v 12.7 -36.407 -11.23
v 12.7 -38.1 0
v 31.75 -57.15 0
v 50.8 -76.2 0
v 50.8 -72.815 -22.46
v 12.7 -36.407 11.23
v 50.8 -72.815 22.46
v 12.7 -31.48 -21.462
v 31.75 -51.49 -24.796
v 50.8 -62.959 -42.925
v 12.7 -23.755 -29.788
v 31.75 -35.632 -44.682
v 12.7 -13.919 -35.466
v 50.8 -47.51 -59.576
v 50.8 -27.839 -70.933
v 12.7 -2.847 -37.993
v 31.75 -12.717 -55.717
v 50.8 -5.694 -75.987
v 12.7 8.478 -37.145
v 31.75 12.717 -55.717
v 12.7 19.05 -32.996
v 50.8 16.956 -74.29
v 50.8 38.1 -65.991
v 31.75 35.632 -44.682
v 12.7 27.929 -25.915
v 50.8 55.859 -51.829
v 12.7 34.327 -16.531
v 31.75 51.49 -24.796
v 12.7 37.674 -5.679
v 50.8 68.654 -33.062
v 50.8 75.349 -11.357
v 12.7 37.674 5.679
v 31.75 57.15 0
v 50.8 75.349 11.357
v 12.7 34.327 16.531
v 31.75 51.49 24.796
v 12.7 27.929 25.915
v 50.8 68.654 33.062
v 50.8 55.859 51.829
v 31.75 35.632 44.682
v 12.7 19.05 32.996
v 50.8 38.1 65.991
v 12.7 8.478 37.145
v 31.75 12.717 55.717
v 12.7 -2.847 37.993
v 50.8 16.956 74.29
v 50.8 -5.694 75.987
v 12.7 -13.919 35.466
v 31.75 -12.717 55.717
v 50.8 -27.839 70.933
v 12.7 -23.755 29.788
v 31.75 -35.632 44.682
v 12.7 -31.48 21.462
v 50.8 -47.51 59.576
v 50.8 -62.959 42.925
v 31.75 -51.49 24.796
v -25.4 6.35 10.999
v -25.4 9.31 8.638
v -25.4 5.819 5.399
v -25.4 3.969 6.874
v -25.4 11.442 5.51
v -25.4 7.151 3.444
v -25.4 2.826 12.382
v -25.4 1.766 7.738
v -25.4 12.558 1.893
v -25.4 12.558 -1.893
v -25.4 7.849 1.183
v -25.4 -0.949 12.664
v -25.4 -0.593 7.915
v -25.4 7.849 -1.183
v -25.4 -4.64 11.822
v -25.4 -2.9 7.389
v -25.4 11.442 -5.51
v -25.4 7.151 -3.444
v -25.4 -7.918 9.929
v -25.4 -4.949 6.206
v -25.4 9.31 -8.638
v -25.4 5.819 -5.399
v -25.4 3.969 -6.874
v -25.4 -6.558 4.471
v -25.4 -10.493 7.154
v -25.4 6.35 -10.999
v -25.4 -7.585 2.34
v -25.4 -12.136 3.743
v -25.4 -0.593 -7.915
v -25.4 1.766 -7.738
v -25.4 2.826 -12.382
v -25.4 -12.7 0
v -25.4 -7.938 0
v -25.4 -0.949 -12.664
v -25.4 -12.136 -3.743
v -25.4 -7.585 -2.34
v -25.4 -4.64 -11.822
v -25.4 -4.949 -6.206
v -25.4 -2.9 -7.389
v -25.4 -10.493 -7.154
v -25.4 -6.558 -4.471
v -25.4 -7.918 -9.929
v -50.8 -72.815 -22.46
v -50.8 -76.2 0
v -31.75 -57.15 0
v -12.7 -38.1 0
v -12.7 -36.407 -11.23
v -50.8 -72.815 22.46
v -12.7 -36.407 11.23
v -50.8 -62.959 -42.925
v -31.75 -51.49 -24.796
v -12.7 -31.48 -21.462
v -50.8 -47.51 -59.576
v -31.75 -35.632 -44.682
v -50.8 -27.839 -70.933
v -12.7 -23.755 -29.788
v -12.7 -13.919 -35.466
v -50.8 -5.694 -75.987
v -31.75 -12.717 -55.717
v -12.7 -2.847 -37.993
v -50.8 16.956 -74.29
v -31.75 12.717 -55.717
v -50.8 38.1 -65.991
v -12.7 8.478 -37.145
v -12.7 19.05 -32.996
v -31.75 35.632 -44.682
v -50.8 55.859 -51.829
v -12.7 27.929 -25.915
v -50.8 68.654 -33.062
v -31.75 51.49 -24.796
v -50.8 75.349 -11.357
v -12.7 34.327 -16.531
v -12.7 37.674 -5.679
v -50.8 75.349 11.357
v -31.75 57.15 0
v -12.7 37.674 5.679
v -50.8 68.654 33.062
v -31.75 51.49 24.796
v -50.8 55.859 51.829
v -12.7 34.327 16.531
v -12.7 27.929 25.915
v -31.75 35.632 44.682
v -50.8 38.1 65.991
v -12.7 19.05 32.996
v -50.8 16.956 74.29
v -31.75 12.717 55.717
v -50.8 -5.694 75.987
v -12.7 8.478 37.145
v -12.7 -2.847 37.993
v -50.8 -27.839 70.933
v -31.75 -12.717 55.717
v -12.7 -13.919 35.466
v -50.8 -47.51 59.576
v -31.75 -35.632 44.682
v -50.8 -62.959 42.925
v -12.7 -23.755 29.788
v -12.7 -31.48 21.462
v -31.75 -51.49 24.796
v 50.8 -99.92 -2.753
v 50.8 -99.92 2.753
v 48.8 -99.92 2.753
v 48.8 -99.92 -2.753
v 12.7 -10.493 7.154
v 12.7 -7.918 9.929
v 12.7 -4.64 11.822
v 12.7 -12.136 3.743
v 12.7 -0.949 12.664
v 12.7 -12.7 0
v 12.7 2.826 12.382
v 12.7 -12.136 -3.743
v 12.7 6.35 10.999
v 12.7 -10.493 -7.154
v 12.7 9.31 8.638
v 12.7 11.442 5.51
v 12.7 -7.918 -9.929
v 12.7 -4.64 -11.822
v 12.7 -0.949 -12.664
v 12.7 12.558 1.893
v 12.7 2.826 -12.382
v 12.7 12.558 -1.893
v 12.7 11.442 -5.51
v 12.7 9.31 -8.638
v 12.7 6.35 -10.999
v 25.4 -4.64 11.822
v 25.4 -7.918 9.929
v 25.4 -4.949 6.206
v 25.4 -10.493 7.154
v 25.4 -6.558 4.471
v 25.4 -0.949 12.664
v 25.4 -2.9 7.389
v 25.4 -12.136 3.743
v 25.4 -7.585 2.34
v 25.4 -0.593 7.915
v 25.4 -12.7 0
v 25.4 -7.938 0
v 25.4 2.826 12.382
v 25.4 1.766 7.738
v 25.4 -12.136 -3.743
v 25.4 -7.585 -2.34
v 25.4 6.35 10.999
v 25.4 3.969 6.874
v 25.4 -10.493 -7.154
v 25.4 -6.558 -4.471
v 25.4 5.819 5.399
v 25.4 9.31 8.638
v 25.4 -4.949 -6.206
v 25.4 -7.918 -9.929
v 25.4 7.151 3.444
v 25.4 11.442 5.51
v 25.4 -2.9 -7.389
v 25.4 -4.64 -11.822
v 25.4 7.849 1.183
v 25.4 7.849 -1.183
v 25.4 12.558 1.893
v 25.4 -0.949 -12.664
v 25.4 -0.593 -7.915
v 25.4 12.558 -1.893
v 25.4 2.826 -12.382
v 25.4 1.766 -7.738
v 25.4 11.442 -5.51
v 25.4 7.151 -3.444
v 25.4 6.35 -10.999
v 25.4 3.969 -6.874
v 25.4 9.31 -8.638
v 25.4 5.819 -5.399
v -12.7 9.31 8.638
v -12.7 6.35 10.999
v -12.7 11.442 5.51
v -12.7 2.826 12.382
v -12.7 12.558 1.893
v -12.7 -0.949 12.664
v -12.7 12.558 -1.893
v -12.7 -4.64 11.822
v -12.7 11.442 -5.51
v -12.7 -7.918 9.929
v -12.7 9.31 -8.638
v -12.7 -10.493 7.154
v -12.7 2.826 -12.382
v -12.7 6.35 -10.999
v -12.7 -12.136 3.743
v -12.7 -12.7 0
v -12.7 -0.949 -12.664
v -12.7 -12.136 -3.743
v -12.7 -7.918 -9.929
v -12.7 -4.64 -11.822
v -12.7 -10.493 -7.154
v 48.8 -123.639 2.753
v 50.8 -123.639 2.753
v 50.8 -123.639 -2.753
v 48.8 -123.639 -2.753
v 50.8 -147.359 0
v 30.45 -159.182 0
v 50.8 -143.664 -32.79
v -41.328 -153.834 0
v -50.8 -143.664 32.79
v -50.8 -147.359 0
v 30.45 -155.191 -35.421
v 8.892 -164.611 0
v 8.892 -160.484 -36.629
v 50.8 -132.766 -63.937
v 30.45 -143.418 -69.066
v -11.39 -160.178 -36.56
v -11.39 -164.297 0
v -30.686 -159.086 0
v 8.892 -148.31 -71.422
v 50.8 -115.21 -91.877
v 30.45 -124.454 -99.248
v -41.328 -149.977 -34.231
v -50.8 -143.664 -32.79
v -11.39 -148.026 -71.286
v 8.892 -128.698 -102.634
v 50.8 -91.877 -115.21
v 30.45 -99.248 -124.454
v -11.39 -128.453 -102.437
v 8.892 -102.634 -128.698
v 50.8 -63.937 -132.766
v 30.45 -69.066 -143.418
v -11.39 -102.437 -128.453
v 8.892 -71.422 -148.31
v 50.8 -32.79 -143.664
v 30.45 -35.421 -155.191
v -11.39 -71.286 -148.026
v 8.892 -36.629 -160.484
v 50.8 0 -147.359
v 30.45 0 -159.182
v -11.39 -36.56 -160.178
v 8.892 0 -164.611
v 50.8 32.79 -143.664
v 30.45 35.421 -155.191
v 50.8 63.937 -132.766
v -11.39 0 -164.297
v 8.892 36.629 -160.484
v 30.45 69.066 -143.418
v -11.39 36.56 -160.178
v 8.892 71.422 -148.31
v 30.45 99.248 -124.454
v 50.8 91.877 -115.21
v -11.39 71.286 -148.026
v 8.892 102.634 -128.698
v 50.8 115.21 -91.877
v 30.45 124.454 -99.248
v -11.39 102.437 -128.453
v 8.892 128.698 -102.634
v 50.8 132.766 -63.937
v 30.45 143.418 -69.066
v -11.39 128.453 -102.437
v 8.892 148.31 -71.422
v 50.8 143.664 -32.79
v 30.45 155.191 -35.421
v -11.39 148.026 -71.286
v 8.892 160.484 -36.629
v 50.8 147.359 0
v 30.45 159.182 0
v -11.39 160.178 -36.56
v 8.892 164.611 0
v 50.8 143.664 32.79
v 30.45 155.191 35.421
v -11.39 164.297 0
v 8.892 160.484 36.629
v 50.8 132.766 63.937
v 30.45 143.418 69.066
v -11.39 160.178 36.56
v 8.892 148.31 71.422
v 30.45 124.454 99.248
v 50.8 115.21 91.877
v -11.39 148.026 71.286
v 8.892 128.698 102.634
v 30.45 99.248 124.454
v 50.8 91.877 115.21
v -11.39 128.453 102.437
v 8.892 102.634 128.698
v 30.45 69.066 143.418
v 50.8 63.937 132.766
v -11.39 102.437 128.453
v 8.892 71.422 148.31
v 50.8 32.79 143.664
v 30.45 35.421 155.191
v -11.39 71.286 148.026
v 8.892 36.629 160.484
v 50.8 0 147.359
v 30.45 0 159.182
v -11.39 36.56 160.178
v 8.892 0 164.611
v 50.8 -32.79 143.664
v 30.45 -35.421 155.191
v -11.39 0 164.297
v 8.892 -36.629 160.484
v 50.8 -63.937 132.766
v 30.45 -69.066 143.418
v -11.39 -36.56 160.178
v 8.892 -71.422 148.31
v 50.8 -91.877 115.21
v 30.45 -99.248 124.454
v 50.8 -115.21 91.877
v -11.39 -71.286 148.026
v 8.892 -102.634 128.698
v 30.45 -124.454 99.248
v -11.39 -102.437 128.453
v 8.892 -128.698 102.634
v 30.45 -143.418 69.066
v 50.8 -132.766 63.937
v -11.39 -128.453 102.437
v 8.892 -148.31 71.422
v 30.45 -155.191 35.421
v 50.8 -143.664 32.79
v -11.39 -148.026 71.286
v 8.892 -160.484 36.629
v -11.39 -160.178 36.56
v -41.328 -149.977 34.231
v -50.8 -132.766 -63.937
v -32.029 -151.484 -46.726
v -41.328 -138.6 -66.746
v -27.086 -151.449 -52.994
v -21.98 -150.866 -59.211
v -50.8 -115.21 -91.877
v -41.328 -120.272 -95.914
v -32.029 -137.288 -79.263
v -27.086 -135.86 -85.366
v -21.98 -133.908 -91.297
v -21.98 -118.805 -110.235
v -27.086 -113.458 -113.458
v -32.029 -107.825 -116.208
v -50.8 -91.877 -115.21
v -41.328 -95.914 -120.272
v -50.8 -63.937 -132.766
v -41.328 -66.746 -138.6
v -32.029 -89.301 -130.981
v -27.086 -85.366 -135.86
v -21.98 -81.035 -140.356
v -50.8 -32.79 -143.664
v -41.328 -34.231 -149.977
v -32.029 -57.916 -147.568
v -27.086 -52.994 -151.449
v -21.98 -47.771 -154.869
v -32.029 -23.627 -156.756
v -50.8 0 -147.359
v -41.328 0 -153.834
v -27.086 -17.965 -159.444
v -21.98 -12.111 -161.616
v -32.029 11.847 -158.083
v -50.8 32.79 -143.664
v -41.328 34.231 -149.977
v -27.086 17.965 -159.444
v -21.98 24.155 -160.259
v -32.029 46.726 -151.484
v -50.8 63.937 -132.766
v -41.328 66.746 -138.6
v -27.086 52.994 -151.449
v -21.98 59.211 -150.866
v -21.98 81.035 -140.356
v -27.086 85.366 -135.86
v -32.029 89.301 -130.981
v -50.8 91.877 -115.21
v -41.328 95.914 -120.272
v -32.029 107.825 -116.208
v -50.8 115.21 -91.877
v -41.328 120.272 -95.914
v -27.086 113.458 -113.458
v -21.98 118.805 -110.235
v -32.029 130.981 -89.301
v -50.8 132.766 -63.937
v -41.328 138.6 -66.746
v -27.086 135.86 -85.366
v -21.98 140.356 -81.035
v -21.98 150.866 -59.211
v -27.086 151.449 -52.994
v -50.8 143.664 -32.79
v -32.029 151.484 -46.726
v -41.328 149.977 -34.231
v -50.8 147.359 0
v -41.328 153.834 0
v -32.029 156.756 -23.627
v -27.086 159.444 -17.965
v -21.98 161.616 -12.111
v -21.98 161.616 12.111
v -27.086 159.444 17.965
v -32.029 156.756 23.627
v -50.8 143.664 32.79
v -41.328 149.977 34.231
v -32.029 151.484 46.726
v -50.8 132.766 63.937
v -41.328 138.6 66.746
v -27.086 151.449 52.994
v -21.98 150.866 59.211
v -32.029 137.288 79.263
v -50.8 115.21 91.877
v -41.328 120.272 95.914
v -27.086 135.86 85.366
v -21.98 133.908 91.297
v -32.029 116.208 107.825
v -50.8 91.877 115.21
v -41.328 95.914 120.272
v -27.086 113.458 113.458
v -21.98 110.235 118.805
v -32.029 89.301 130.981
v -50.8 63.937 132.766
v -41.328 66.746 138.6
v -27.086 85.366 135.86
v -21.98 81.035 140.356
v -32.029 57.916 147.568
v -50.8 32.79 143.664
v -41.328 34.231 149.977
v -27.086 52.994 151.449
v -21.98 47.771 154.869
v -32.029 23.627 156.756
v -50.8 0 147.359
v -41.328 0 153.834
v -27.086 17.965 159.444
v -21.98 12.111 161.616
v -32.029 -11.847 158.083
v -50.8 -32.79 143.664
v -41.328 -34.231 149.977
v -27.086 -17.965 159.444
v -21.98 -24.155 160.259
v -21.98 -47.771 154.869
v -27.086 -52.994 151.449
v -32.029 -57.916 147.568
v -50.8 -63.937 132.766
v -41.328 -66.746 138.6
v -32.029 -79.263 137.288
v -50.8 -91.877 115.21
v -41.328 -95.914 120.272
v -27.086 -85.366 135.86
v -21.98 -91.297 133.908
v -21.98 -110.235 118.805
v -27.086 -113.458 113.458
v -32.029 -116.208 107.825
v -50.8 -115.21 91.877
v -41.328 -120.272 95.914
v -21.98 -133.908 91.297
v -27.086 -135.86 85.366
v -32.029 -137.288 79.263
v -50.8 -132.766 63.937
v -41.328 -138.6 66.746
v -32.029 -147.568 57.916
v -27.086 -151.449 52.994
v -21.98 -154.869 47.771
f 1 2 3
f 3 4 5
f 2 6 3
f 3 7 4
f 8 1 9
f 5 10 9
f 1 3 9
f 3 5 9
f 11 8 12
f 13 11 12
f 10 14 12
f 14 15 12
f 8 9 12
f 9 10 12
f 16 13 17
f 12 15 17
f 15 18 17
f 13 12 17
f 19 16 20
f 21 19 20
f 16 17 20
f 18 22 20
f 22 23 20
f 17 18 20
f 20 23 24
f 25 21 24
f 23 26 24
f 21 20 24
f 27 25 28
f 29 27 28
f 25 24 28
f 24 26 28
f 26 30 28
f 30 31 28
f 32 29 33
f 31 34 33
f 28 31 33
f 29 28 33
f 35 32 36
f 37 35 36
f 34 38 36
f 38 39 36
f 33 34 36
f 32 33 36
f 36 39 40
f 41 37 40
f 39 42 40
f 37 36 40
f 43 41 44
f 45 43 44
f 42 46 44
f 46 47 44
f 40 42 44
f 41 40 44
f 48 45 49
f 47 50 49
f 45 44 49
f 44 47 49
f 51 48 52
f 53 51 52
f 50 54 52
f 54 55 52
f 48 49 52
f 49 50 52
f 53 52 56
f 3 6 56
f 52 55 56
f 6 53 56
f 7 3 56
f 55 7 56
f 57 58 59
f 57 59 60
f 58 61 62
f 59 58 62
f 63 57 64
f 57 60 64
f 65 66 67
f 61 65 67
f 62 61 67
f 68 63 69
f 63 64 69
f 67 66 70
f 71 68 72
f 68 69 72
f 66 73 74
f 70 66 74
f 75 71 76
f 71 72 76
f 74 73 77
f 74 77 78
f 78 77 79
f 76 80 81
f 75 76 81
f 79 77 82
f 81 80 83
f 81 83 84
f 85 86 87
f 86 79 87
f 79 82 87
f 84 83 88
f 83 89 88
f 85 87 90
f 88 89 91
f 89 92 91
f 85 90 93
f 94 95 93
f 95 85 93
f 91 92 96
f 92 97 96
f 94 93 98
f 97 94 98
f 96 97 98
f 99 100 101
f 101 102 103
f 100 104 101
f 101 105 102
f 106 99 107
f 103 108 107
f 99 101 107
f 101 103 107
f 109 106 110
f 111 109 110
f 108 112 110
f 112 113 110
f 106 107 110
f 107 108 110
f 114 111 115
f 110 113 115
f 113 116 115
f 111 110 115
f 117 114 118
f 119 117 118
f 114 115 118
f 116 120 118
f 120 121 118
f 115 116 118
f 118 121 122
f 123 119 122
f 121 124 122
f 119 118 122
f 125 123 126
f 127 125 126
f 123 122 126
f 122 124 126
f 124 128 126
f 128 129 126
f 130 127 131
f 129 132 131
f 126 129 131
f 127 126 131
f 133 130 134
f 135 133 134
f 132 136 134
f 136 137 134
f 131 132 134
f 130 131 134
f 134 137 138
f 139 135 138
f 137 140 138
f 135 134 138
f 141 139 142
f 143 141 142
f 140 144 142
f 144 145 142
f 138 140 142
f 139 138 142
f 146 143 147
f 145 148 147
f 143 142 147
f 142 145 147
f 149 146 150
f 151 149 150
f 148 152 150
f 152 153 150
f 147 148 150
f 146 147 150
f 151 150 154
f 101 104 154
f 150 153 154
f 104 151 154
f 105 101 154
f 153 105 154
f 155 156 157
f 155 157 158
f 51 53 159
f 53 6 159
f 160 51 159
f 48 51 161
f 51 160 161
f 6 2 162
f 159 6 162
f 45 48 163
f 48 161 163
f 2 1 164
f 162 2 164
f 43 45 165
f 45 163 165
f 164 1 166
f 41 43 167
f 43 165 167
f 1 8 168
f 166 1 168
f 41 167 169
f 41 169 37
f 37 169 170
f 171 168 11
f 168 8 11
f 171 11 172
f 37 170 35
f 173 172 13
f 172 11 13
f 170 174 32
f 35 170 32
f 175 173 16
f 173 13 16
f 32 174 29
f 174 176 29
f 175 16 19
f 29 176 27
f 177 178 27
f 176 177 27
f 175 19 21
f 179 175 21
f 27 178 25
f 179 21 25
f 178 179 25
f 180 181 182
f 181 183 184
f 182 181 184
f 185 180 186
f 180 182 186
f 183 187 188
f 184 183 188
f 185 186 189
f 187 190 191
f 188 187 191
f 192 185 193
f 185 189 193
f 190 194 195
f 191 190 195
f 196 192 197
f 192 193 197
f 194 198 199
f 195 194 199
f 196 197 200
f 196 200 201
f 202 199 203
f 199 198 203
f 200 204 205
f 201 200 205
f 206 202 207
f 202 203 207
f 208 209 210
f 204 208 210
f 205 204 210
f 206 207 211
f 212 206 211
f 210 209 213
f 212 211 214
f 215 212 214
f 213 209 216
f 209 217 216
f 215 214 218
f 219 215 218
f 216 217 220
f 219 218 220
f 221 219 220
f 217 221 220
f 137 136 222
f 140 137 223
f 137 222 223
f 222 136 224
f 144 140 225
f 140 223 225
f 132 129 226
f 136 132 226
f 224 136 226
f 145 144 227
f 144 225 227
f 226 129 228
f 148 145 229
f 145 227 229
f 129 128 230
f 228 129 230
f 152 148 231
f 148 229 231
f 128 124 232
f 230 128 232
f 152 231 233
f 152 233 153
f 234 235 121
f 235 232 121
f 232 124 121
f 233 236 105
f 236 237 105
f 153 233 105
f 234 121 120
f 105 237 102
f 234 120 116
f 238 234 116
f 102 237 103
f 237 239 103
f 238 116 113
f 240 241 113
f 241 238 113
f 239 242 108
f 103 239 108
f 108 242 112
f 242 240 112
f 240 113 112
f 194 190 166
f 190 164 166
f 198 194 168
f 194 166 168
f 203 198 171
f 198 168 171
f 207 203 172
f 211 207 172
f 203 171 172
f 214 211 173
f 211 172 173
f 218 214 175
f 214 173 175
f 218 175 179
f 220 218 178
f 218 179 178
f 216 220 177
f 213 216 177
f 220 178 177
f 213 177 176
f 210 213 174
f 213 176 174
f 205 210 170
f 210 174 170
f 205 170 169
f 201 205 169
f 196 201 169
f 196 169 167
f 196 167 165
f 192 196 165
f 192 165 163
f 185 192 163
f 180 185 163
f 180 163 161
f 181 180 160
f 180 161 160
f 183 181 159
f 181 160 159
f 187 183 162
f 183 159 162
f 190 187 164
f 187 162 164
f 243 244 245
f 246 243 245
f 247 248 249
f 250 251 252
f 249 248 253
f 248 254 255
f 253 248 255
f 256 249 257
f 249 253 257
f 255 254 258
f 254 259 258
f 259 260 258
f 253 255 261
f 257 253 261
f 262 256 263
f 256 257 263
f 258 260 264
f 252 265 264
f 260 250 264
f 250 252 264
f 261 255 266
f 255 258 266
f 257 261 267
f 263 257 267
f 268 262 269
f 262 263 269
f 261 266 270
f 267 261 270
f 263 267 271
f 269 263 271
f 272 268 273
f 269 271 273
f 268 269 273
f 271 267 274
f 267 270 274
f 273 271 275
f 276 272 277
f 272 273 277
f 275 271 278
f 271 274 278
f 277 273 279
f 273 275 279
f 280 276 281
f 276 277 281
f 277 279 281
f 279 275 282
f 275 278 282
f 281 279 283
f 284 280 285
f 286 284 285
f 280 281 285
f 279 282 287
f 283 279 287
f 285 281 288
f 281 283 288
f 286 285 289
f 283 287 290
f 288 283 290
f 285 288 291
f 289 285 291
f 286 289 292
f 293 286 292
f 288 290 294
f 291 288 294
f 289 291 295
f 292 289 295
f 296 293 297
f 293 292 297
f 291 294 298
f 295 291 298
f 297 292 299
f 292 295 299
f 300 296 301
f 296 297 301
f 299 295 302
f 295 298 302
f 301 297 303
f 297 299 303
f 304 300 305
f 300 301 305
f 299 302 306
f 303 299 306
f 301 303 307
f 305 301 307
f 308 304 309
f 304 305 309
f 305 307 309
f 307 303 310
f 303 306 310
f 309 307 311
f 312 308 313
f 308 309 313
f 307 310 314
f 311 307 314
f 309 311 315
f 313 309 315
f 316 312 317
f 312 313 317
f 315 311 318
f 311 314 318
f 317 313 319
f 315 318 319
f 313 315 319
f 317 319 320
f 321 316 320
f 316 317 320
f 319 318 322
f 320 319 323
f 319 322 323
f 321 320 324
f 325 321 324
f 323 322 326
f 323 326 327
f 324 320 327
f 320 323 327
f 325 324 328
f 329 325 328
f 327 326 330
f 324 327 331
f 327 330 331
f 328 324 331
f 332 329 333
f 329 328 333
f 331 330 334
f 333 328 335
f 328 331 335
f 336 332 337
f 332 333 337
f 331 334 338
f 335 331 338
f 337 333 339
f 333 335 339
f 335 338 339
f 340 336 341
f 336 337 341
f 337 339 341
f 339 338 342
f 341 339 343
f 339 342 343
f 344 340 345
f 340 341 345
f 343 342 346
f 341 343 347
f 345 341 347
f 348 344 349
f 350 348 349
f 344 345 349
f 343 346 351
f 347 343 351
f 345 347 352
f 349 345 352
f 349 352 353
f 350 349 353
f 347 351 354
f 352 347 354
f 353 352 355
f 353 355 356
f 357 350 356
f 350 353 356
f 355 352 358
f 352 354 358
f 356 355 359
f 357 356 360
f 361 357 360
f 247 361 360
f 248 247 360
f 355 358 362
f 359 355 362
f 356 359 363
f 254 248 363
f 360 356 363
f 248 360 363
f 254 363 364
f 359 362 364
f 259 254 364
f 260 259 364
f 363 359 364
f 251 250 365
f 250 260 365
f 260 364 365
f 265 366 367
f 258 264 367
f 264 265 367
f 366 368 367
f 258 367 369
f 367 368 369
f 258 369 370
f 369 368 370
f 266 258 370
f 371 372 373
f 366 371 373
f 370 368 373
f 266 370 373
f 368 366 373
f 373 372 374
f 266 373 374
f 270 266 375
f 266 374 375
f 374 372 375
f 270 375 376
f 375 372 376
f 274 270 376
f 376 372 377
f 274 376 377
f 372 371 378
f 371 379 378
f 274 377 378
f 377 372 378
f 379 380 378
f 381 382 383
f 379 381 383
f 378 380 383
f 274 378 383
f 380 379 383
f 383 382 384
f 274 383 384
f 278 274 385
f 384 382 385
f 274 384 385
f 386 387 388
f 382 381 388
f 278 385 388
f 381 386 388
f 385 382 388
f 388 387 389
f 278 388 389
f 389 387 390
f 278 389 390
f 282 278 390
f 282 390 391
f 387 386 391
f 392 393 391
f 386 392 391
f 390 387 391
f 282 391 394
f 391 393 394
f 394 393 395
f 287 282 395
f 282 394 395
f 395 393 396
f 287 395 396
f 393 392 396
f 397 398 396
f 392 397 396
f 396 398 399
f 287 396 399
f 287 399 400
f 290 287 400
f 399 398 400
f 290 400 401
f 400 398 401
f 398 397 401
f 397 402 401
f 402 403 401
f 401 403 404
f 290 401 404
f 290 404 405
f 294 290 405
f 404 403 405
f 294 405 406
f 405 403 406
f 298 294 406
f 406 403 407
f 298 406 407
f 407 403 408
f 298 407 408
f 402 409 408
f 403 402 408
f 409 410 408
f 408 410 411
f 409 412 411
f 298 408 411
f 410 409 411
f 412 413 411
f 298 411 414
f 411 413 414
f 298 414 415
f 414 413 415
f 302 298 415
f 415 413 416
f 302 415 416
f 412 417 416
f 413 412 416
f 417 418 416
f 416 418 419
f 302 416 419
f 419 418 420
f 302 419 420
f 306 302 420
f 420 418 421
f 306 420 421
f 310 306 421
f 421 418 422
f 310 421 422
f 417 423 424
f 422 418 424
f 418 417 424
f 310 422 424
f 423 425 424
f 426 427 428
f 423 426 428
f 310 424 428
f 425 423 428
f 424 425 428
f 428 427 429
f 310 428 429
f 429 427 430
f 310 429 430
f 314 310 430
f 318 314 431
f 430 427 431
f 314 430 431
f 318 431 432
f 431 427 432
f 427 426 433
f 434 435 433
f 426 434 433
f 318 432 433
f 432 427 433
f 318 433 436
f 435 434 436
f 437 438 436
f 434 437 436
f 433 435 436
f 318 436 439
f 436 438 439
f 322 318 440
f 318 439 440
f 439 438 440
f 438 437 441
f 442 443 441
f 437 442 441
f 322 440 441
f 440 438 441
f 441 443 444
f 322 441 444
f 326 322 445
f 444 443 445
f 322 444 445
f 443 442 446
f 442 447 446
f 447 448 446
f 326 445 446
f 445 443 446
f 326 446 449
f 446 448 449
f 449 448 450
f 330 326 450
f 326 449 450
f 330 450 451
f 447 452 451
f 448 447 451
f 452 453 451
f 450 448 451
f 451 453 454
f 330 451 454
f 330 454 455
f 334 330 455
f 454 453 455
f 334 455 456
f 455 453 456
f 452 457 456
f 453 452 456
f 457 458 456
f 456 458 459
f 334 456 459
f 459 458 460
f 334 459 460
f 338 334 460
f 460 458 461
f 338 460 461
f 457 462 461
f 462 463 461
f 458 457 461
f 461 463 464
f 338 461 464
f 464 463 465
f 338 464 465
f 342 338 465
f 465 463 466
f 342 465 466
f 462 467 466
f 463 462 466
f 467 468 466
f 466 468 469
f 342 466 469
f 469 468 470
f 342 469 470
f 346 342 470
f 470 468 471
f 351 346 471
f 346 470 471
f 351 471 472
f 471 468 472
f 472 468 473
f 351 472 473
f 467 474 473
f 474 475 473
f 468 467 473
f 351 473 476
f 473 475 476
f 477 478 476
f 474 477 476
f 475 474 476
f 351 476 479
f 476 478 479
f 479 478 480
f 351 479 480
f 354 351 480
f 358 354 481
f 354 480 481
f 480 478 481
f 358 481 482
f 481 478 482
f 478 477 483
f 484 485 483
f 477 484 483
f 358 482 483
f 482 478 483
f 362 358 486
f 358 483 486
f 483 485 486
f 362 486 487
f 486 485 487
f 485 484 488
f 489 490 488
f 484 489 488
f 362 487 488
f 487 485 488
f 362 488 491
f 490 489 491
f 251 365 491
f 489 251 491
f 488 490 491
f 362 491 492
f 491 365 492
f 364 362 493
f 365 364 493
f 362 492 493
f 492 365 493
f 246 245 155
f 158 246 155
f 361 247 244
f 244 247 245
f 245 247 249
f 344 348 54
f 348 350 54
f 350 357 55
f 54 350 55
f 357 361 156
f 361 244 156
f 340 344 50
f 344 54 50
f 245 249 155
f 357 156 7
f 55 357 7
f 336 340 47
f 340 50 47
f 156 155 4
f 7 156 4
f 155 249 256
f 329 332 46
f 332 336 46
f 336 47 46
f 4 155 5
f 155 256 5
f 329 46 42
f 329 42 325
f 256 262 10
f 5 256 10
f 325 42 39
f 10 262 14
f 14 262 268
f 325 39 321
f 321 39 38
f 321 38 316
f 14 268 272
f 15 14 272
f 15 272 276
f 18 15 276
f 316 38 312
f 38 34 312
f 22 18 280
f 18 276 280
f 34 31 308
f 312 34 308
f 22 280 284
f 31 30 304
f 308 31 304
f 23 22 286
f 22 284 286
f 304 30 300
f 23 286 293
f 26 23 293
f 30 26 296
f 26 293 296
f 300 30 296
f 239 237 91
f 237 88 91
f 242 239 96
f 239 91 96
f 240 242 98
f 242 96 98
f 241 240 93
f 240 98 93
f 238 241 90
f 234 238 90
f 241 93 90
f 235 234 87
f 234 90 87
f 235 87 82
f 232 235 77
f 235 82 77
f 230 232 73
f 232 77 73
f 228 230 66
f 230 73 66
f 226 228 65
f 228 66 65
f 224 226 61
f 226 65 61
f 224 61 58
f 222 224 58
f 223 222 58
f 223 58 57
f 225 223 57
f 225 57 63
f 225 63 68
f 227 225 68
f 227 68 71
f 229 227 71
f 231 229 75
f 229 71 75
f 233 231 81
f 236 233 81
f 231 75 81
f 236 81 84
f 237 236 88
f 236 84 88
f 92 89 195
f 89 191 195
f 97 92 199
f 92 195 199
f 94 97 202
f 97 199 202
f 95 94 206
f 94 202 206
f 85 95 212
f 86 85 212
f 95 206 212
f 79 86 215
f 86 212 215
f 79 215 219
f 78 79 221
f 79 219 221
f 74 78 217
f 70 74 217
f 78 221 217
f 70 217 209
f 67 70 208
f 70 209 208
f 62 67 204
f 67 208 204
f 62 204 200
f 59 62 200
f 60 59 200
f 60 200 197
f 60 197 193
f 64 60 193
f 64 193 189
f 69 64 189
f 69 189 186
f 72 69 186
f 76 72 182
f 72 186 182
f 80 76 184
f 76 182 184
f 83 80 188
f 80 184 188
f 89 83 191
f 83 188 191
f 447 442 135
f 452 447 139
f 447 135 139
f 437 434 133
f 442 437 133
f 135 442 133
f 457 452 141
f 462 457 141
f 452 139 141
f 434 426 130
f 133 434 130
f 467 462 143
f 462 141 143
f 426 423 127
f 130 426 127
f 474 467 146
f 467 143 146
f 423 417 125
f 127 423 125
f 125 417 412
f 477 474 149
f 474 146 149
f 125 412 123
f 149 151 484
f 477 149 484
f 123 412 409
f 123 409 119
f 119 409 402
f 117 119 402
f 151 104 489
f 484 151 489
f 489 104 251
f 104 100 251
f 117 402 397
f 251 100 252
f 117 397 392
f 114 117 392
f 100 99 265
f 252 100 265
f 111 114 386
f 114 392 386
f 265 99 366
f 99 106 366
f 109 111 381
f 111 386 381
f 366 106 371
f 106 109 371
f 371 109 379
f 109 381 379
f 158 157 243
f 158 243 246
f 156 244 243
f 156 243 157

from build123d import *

# Parameters (mm, degrees)
SKETCH8_W          = 5.505636966
SKETCH8_H          = 23.71955036
CUT_EXTRUDE1_DEPTH = 2


with BuildPart() as part:
    # Sketch7 → Revolve6 (revolve)
    with BuildSketch(Plane.XY, mode=Mode.PRIVATE) as revolve6_sk:
        with BuildLine():
            Line((50.8, 76.2), (50.8, 147.35865108))
            add(Edge.make_bspline(
                [(50.8, 147.35865108), (0, 187.484544424), (-50.8, 147.35865108)],
                knots=[2.485810722, 2.485810722, 2.485810722, 3.797374586, 3.797374586, 3.797374586], degree=2, weights=[1, 0.792571365, 1]))
            Line((-50.8, 147.35865108), (-50.8, 76.2))
            Line((-50.8, 76.2), (-12.7, 38.1))
            Line((-12.7, 38.1), (-12.7, 12.7))
            Line((-12.7, 12.7), (-25.4, 12.7))
            Line((-25.4, 12.7), (-25.4, 7.9375))
            Line((-25.4, 7.9375), (25.4, 7.9375))
            Line((25.4, 7.9375), (25.4, 12.7))
            Line((25.4, 12.7), (12.7, 12.7))
            Line((12.7, 12.7), (12.7, 38.1))
            Line((12.7, 38.1), (50.8, 76.2))
        make_face()
    revolve(revolve6_sk.sketch.rotate(Axis((-25.4, 0, 0), (1, 0, 0)), 180), axis=Axis((-25.4, 0, 0), (1, 0, 0)))

    # Sketch8 → Cut-Extrude1 (cut)
    with BuildSketch(Plane(origin=(50.8, 0, 0), x_dir=(0, 0, -1), z_dir=(1, 0, 0))):
        with Locations((0, -111.77932554)):
            Rectangle(SKETCH8_W, SKETCH8_H)
    extrude(amount=-CUT_EXTRUDE1_DEPTH, mode=Mode.SUBTRACT)


solid = part.part
